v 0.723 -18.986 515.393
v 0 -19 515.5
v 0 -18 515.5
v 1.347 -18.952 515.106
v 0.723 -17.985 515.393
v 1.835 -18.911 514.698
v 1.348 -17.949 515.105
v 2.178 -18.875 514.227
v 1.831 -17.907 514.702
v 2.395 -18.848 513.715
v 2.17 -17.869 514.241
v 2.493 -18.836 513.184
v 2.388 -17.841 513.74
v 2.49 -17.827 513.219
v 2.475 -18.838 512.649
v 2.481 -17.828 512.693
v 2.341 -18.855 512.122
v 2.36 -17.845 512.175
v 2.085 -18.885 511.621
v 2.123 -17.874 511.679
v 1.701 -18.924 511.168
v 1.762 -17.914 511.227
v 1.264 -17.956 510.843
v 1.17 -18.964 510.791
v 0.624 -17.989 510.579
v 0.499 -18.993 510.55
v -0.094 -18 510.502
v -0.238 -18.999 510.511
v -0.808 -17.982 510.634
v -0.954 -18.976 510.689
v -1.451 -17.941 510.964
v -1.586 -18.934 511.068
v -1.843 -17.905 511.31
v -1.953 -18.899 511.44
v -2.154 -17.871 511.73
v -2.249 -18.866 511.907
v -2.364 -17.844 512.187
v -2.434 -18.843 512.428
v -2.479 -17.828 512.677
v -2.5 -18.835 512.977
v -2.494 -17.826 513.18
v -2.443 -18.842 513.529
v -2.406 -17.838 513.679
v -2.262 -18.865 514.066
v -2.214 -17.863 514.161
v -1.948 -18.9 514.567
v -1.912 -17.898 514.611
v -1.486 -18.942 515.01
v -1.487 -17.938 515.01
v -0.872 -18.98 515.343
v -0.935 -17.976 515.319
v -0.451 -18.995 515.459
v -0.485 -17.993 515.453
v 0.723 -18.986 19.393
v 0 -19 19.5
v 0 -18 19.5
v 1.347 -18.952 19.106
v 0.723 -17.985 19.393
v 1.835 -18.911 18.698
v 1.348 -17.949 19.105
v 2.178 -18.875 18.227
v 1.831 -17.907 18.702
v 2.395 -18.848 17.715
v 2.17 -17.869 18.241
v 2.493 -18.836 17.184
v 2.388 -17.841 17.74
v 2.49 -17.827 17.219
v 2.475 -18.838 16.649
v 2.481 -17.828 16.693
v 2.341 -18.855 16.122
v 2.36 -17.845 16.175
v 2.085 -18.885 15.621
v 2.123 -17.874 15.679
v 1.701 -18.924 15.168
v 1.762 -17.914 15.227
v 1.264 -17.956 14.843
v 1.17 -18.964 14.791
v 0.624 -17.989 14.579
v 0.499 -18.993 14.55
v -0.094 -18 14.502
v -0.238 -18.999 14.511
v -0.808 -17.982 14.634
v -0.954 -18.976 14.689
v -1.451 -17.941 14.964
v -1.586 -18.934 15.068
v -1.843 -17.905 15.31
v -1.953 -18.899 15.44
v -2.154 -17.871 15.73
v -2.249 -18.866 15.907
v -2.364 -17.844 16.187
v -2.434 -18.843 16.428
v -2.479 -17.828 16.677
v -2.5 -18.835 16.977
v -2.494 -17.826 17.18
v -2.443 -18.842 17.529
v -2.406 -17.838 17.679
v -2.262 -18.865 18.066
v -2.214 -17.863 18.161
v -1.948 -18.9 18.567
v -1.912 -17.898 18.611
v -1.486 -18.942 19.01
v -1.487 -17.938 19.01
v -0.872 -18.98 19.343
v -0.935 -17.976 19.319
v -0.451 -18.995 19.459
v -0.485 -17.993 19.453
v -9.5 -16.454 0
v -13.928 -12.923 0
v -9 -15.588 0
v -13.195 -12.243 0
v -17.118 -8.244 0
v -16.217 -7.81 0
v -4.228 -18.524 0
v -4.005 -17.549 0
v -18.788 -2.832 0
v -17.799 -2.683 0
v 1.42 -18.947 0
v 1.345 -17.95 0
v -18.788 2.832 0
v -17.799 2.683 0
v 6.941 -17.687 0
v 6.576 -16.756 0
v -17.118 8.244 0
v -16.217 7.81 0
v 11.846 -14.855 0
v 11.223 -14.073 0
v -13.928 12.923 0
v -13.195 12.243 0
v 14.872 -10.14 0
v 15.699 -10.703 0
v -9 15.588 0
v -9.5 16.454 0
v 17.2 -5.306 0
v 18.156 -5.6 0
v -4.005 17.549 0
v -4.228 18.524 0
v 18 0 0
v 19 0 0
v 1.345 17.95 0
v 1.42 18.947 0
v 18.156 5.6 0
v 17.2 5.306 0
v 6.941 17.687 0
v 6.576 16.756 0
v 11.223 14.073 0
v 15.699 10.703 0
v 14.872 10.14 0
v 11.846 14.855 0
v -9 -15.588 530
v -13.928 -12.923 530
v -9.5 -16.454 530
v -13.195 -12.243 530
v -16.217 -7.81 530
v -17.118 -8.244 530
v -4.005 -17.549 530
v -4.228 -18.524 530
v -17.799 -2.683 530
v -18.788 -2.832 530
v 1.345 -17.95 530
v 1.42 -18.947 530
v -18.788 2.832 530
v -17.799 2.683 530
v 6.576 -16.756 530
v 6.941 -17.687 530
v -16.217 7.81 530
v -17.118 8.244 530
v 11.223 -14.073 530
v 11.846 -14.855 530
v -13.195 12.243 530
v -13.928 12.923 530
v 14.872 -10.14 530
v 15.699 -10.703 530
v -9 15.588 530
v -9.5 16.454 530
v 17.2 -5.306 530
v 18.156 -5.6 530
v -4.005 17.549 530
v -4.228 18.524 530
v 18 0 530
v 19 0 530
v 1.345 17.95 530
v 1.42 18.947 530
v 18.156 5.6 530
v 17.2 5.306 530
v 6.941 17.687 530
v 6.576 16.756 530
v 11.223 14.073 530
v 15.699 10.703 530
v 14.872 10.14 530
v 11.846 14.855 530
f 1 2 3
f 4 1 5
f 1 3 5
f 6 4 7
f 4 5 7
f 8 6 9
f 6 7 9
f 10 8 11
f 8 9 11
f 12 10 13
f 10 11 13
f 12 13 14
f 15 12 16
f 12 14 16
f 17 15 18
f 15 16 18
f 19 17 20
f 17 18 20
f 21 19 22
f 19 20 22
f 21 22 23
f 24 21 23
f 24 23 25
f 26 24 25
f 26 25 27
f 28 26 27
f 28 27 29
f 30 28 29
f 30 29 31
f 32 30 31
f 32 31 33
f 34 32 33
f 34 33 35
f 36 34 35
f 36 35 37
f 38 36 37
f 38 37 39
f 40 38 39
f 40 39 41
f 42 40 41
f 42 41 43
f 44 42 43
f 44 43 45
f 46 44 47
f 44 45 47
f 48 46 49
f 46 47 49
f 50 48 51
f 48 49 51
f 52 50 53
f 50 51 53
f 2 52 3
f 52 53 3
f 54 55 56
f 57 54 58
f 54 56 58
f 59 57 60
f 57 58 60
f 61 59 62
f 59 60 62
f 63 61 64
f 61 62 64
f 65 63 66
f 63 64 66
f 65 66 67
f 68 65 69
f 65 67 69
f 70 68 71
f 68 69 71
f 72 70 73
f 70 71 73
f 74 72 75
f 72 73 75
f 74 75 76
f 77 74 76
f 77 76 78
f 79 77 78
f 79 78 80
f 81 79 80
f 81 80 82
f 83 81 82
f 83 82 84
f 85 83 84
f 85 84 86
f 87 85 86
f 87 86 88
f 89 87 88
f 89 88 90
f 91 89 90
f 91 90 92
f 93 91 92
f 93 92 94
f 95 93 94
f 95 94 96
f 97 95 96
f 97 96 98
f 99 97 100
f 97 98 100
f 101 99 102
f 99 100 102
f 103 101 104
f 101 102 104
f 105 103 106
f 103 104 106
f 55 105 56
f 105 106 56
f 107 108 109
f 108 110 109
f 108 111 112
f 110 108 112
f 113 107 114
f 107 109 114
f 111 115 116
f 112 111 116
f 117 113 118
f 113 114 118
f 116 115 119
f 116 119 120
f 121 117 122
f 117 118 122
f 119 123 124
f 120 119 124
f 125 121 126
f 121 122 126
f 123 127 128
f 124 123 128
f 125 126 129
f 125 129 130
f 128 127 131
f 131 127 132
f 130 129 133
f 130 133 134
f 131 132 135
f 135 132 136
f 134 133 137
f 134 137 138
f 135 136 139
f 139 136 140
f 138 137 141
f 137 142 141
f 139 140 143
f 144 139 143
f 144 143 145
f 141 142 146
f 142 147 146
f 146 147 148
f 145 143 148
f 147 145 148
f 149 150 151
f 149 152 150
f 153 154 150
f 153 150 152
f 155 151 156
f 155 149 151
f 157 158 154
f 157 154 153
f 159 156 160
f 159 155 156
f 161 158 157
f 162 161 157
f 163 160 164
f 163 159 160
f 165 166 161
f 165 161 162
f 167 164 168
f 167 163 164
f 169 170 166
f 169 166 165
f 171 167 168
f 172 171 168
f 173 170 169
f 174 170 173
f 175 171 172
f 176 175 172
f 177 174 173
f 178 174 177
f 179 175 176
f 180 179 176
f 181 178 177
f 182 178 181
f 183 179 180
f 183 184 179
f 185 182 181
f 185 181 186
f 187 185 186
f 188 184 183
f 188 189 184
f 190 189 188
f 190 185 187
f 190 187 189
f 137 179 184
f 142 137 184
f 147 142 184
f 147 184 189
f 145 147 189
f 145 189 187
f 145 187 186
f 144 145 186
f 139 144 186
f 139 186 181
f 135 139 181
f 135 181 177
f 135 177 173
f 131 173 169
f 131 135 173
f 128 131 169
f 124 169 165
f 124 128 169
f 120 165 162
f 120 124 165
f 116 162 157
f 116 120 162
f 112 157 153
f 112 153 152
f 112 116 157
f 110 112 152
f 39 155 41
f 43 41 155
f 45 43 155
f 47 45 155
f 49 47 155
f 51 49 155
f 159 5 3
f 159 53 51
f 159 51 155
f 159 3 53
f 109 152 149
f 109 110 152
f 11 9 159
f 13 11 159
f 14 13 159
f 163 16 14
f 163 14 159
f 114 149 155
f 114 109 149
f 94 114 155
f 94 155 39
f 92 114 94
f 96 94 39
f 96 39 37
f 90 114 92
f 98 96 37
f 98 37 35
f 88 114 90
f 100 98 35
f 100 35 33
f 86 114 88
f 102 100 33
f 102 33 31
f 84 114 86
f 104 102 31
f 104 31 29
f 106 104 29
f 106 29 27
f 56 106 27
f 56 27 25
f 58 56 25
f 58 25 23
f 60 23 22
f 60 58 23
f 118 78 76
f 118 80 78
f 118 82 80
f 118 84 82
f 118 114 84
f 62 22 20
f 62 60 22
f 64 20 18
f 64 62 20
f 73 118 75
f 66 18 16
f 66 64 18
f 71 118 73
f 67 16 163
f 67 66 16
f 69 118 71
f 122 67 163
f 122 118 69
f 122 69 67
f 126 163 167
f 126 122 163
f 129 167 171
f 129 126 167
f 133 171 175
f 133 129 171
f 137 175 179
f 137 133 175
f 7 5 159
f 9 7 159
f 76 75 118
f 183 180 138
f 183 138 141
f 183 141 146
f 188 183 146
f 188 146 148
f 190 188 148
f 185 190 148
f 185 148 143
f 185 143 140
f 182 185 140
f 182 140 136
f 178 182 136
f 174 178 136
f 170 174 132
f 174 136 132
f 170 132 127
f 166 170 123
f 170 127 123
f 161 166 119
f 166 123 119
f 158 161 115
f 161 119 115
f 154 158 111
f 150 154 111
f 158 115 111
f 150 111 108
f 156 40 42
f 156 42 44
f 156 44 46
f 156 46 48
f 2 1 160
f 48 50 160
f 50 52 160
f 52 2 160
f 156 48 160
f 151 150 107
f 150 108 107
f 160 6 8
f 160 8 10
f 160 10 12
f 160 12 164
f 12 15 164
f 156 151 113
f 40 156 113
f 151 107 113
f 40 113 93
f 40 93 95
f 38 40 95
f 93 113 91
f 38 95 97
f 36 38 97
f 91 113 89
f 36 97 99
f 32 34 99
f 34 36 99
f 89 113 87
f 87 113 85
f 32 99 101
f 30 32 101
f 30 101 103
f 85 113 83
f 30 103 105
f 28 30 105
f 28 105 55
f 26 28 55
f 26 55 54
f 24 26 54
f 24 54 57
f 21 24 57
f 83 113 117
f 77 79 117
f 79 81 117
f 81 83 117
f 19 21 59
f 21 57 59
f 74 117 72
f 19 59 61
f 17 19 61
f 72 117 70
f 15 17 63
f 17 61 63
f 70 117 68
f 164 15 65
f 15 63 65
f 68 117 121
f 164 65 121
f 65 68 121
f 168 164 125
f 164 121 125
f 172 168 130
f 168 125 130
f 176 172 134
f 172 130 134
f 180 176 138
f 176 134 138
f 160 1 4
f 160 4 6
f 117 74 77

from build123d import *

# Parameters (mm, degrees)
ESQUISSE1_R             = 19
ESQUISSE1_R_2           = 18
BOSS_EXTRU_1_DEPTH      = 530
ESQUISSE2_R             = 2.5
ENL_V_MAT_EXTRU_1_DEPTH = 531.680694957
ESQUISSE4_R             = 2.5
ENL_V_MAT_EXTRU_2_DEPTH = 531.680695064


with BuildPart() as part:
    # Esquisse1 → Boss.-Extru.1 (new body)
    with BuildSketch(Plane.XY):
        Circle(ESQUISSE1_R)
        Circle(ESQUISSE1_R_2, mode=Mode.SUBTRACT)
    extrude(amount=BOSS_EXTRU_1_DEPTH)

    # Esquisse2 → Enlèv. mat.-Extru.1 (cut, through all)
    with BuildSketch(Plane(origin=(0, 0, 0), x_dir=(1, 0, 0), z_dir=(0, 1, 0))):
        with Locations(Location((0, -17, 0), (0, 0, 270))):
            Circle(ESQUISSE2_R)
    extrude(amount=-ENL_V_MAT_EXTRU_1_DEPTH, mode=Mode.SUBTRACT)

    # Esquisse4 → Enlèv. mat.-Extru.2 (cut, through all)
    with BuildSketch(Plane(origin=(0, 0, 0), x_dir=(1, 0, 0), z_dir=(0, 1, 0))):
        with Locations(Location((0, -513, 0), (0, 0, 270))):
            Circle(ESQUISSE4_R)
    extrude(amount=-ENL_V_MAT_EXTRU_2_DEPTH, mode=Mode.SUBTRACT)


solid = part.part
